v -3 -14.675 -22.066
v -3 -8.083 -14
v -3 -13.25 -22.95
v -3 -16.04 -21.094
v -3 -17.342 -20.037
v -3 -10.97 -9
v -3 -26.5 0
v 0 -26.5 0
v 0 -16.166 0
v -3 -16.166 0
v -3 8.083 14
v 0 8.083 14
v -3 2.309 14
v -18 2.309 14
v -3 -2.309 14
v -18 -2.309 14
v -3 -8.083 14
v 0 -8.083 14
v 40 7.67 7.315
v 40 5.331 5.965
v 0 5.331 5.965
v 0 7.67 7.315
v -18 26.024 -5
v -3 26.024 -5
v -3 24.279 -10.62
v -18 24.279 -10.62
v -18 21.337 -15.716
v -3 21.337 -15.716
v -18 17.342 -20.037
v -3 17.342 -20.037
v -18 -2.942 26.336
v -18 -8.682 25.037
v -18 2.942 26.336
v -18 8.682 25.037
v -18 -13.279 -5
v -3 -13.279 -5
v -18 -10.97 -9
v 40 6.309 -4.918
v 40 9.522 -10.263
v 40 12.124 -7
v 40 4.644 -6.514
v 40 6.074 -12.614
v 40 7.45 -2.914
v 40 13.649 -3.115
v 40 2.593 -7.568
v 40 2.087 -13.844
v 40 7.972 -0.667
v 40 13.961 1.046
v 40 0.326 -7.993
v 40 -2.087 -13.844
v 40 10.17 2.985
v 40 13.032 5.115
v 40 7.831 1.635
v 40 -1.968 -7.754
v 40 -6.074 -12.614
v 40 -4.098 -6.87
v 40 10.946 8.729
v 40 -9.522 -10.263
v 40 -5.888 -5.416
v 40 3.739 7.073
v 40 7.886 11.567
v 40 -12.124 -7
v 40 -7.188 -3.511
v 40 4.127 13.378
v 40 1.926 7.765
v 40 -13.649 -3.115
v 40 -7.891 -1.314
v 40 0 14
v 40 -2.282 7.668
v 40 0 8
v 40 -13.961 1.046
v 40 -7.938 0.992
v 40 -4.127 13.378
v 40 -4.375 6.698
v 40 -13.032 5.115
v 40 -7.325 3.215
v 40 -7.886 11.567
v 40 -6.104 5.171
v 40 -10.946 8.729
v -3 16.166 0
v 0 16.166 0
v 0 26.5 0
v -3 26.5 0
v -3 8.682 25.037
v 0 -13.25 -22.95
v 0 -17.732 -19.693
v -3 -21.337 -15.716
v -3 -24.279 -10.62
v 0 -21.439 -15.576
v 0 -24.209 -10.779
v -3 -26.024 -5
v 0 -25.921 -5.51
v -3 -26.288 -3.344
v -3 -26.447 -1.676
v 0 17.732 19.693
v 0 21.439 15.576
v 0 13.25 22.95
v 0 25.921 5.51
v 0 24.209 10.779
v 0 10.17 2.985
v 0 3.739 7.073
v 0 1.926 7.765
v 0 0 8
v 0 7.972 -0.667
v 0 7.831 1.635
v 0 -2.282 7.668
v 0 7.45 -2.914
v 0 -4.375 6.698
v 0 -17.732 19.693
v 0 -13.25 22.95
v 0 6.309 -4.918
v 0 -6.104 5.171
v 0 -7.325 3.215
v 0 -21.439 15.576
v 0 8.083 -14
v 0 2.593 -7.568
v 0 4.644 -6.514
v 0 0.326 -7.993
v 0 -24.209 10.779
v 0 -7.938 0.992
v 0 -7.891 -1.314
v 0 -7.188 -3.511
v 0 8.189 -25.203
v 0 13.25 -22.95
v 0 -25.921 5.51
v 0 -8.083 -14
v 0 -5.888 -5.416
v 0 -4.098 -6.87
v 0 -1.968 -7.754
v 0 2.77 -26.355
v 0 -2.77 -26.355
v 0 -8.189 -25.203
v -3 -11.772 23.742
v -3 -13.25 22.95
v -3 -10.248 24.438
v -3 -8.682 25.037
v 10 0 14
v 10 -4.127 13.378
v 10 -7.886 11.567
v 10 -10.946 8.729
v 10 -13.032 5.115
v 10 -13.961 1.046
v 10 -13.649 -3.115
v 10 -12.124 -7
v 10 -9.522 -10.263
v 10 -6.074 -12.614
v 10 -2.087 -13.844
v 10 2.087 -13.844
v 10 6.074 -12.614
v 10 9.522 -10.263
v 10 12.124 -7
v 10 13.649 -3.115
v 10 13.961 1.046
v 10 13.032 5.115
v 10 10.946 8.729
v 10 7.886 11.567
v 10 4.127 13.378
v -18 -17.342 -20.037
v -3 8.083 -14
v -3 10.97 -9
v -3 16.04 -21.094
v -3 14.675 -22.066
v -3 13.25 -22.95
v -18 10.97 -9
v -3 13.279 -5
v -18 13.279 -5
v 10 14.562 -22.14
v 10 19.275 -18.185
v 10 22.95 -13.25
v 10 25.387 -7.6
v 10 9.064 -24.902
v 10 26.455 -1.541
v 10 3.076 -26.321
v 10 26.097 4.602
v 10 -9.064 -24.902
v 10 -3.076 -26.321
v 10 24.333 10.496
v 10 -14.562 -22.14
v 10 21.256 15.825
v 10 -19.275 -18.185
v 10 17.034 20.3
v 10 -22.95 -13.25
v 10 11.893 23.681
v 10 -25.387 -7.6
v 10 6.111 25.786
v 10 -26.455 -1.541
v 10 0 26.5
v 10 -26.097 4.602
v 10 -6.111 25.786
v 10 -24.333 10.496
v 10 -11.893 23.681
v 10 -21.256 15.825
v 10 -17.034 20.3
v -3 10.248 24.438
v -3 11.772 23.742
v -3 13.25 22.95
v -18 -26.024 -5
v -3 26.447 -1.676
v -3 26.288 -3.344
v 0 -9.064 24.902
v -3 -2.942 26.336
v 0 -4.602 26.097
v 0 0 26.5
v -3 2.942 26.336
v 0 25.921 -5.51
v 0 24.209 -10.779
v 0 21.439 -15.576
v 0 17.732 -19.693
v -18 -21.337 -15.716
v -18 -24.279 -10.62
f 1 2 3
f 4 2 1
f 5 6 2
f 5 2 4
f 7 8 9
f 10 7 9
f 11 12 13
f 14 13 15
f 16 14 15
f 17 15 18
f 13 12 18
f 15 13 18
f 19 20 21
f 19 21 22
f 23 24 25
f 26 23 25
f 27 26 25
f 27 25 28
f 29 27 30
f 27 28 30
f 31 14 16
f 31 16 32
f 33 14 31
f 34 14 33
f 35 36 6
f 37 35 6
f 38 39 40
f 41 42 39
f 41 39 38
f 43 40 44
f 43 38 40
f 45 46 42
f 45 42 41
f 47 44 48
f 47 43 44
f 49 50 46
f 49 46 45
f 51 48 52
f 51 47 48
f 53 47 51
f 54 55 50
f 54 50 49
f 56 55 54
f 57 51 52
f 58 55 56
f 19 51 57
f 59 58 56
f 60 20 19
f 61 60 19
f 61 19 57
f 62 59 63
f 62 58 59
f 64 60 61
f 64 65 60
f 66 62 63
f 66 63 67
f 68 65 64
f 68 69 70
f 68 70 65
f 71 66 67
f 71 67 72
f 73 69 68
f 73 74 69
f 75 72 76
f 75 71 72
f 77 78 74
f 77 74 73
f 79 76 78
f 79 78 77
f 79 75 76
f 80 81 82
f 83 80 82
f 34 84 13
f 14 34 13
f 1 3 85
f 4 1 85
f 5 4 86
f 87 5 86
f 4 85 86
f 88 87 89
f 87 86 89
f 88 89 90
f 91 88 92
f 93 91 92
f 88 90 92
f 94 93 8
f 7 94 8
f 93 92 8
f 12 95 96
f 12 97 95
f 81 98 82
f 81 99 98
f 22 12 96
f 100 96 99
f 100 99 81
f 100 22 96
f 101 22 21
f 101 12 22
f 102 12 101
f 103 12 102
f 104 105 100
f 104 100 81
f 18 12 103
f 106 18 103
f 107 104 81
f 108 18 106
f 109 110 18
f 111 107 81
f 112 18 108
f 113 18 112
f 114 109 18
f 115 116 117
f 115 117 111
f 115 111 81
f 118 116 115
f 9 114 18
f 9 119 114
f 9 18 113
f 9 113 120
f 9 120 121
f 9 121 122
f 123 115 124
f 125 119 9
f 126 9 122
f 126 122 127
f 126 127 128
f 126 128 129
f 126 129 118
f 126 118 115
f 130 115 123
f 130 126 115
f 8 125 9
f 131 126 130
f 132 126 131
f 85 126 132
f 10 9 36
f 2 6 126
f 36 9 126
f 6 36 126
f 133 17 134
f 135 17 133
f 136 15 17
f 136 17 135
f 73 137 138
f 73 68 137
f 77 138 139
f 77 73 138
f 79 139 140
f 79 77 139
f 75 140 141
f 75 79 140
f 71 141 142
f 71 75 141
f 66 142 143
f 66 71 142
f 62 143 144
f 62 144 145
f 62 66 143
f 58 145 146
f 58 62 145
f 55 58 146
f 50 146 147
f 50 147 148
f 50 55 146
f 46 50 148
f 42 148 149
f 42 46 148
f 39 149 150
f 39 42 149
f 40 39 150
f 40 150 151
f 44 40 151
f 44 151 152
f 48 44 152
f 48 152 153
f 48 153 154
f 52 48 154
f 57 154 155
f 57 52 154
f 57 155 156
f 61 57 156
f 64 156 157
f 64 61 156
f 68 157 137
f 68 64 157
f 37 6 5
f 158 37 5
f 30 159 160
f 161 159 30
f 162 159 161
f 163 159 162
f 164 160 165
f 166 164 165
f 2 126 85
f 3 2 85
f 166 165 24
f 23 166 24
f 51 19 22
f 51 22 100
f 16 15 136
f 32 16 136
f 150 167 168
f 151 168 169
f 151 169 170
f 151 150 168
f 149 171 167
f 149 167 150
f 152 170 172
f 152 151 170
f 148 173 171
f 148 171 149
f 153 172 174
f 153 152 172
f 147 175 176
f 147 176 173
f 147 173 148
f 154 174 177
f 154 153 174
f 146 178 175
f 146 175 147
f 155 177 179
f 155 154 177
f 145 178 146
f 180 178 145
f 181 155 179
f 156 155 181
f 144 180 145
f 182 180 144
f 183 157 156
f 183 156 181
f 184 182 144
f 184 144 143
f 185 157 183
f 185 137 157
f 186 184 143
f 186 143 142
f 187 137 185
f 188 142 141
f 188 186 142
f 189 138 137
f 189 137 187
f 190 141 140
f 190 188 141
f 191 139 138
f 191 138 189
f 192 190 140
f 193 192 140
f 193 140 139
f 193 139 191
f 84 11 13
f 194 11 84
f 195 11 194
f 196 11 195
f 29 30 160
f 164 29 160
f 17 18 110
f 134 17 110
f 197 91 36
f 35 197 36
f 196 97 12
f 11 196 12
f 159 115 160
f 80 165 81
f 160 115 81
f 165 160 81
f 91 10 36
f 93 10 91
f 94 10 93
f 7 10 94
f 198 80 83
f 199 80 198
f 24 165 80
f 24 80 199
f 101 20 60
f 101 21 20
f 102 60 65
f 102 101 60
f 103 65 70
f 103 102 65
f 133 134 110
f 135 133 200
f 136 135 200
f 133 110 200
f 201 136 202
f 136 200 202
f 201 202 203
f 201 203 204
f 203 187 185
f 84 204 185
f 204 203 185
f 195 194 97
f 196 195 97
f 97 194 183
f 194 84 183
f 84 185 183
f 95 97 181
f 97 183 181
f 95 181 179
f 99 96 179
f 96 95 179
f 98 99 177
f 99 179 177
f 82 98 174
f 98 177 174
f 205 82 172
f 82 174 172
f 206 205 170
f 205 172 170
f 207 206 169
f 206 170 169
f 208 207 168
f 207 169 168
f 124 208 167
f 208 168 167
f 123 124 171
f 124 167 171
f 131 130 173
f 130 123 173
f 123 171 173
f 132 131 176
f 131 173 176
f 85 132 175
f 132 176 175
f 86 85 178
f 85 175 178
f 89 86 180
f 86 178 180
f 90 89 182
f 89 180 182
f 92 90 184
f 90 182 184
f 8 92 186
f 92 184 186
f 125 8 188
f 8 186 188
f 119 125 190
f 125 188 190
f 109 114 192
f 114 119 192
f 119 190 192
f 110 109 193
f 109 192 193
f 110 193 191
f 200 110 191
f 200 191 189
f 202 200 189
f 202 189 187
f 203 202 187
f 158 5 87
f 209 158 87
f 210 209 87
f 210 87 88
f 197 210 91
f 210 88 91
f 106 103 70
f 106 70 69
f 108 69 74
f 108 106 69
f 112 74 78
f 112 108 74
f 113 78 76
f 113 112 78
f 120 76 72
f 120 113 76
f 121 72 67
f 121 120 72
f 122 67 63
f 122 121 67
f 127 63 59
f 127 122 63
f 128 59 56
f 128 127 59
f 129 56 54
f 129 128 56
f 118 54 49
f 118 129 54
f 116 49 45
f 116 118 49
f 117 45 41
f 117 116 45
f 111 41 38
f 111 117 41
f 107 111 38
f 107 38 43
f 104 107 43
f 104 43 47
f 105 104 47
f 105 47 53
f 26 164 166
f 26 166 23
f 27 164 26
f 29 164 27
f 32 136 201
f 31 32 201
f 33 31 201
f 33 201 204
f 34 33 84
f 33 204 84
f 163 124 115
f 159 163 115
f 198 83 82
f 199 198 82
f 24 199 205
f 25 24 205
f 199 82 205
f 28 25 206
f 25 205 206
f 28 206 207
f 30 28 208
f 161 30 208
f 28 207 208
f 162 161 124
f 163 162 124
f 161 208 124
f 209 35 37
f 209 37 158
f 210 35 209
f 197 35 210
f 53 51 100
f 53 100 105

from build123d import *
from build123d.topology import SkipClean

# Parameters (mm, degrees)
EXTRUDE_1_DEPTH          = 3
EXTRUDE_2_DEPTH          = 15
PATTERN_CIRCULAR_1_COUNT = 3
CUT_EXTRUDE_1_DEPTH      = 70.054326439


with BuildPart() as part:
    # Эскиз1 → Повернуть1 (revolve)
    with BuildSketch(Plane.XY, mode=Mode.PRIVATE) as revolve_1_sk:
        Polygon((0, 8), (0, 26.5), (10, 26.5), (10, 14), (40, 14), (40, 8), align=None)
    revolve(revolve_1_sk.sketch.rotate(Axis((0, 0, 0), (1, 0, 0)), 90), axis=Axis((0, 0, 0), (1, 0, 0)))

    # Эскиз2 → Бобышка-Вытянуть1 (add)
    with BuildSketch(Plane.ZY):
        with BuildLine():
            Line((22.9496732, 13.25), (14, 8.082903769))
            Line((14, 8.082903769), (14, -8.082903769))
            Line((14, -8.082903769), (22.9496732, -13.25))
            ThreePointArc((22.9496732, -13.25), (26.5, 0), (22.9496732, 13.25))
        make_face()
    extrude_1 = extrude(amount=EXTRUDE_1_DEPTH)

    # Эскиз3 → Бобышка-Вытянуть2 (add)
    with BuildSketch(Plane.ZY.offset(3)):
        with BuildLine():
            Line((25.037468802, 8.681886661), (14, 2.309401077))
            Line((14, 2.309401077), (14, -2.309401077))
            Line((14, -2.309401077), (25.037468802, -8.681886661))
            ThreePointArc((25.037468802, -8.681886661), (26.5, 0), (25.037468802, 8.681886661))
        make_face()
    extrude_2 = extrude(amount=EXTRUDE_2_DEPTH)

    # Круговой массив1: Бобышка-Вытянуть1, Бобышка-Вытянуть2 ×3 about axis
    with SkipClean():  # the faces are left unmerged after this step: merging them gives an invalid solid
        pattern_circular_1_axis = Axis((0, 0, 0), (1, 0, 0))
        add([extrude_1.rotate(pattern_circular_1_axis, i * 360 / PATTERN_CIRCULAR_1_COUNT) for i in range(1, PATTERN_CIRCULAR_1_COUNT)])
        add([extrude_2.rotate(pattern_circular_1_axis, i * 360 / PATTERN_CIRCULAR_1_COUNT) for i in range(1, PATTERN_CIRCULAR_1_COUNT)])

    # Эскиз4 → Вырез-Вытянуть1 (cut, through all)
    with SkipClean():  # the faces are left unmerged after this step: merging them gives an invalid solid
        with BuildSketch(Plane(origin=(40, 0, 0), x_dir=(0, 0, -1), z_dir=(1, 0, 0))):
            Polygon((-7.315063509, 7.670061659), (-2.984936491, 10.170061659), (2.165063509, 1.25), (-2.165063509, -1.25), align=None)
        extrude(amount=-CUT_EXTRUDE_1_DEPTH, mode=Mode.SUBTRACT)


solid = part.part
